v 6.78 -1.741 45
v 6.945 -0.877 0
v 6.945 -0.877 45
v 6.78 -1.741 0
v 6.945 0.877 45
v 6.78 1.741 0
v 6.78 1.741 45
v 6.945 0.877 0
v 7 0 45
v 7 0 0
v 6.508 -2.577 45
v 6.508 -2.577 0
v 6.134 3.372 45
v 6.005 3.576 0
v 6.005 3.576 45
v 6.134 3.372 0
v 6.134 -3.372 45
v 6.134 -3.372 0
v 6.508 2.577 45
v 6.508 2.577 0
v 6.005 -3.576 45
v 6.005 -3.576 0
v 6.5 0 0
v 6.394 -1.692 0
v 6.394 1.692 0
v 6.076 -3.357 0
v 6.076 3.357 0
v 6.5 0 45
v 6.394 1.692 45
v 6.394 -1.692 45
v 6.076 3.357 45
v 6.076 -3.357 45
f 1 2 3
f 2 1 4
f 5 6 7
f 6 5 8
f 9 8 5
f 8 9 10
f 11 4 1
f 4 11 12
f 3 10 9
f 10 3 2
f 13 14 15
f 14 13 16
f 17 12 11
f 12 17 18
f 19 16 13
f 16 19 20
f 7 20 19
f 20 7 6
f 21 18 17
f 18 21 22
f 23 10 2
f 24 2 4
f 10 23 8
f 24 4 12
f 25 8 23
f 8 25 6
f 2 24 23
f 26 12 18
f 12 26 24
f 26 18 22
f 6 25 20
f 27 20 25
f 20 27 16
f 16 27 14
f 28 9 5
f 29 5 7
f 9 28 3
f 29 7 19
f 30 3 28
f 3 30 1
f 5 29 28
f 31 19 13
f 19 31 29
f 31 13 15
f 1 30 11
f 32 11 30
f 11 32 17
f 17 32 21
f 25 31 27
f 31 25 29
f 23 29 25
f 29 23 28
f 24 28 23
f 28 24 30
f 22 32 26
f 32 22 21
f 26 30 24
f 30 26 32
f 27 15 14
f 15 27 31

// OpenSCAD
$fn = 50;


difference() {
	union() {
		cylinder(h = 45, r = 7.0000000000);
		translate(v = [-10.0000000000, 0, 0]) {
			cylinder(h = 45, r = 7.0000000000);
		}
	}
	union() {
		cylinder(h = 45, r = 3.2500000000);
		cylinder(h = 45, r = 1.8000000000);
		cylinder(h = 45, r = 1.8000000000);
		cylinder(h = 45, r = 1.8000000000);
		translate(v = [-14.5000000000, 0, 0]) {
			hull() {
				translate(v = [-3.7500000000, 0.0000000000, 0]) {
					cylinder(h = 45, r = 10.5000000000);
				}
				translate(v = [3.7500000000, 0.0000000000, 0]) {
					cylinder(h = 45, r = 10.5000000000);
				}
				translate(v = [-3.7500000000, -0.0000000000, 0]) {
					cylinder(h = 45, r = 10.5000000000);
				}
				translate(v = [3.7500000000, -0.0000000000, 0]) {
					cylinder(h = 45, r = 10.5000000000);
				}
			}
		}
		translate(v = [-7.0000000000, 0, 0.0000000000]) {
			cylinder(h = 45, r = 13.5000000000);
		}
	}
}
